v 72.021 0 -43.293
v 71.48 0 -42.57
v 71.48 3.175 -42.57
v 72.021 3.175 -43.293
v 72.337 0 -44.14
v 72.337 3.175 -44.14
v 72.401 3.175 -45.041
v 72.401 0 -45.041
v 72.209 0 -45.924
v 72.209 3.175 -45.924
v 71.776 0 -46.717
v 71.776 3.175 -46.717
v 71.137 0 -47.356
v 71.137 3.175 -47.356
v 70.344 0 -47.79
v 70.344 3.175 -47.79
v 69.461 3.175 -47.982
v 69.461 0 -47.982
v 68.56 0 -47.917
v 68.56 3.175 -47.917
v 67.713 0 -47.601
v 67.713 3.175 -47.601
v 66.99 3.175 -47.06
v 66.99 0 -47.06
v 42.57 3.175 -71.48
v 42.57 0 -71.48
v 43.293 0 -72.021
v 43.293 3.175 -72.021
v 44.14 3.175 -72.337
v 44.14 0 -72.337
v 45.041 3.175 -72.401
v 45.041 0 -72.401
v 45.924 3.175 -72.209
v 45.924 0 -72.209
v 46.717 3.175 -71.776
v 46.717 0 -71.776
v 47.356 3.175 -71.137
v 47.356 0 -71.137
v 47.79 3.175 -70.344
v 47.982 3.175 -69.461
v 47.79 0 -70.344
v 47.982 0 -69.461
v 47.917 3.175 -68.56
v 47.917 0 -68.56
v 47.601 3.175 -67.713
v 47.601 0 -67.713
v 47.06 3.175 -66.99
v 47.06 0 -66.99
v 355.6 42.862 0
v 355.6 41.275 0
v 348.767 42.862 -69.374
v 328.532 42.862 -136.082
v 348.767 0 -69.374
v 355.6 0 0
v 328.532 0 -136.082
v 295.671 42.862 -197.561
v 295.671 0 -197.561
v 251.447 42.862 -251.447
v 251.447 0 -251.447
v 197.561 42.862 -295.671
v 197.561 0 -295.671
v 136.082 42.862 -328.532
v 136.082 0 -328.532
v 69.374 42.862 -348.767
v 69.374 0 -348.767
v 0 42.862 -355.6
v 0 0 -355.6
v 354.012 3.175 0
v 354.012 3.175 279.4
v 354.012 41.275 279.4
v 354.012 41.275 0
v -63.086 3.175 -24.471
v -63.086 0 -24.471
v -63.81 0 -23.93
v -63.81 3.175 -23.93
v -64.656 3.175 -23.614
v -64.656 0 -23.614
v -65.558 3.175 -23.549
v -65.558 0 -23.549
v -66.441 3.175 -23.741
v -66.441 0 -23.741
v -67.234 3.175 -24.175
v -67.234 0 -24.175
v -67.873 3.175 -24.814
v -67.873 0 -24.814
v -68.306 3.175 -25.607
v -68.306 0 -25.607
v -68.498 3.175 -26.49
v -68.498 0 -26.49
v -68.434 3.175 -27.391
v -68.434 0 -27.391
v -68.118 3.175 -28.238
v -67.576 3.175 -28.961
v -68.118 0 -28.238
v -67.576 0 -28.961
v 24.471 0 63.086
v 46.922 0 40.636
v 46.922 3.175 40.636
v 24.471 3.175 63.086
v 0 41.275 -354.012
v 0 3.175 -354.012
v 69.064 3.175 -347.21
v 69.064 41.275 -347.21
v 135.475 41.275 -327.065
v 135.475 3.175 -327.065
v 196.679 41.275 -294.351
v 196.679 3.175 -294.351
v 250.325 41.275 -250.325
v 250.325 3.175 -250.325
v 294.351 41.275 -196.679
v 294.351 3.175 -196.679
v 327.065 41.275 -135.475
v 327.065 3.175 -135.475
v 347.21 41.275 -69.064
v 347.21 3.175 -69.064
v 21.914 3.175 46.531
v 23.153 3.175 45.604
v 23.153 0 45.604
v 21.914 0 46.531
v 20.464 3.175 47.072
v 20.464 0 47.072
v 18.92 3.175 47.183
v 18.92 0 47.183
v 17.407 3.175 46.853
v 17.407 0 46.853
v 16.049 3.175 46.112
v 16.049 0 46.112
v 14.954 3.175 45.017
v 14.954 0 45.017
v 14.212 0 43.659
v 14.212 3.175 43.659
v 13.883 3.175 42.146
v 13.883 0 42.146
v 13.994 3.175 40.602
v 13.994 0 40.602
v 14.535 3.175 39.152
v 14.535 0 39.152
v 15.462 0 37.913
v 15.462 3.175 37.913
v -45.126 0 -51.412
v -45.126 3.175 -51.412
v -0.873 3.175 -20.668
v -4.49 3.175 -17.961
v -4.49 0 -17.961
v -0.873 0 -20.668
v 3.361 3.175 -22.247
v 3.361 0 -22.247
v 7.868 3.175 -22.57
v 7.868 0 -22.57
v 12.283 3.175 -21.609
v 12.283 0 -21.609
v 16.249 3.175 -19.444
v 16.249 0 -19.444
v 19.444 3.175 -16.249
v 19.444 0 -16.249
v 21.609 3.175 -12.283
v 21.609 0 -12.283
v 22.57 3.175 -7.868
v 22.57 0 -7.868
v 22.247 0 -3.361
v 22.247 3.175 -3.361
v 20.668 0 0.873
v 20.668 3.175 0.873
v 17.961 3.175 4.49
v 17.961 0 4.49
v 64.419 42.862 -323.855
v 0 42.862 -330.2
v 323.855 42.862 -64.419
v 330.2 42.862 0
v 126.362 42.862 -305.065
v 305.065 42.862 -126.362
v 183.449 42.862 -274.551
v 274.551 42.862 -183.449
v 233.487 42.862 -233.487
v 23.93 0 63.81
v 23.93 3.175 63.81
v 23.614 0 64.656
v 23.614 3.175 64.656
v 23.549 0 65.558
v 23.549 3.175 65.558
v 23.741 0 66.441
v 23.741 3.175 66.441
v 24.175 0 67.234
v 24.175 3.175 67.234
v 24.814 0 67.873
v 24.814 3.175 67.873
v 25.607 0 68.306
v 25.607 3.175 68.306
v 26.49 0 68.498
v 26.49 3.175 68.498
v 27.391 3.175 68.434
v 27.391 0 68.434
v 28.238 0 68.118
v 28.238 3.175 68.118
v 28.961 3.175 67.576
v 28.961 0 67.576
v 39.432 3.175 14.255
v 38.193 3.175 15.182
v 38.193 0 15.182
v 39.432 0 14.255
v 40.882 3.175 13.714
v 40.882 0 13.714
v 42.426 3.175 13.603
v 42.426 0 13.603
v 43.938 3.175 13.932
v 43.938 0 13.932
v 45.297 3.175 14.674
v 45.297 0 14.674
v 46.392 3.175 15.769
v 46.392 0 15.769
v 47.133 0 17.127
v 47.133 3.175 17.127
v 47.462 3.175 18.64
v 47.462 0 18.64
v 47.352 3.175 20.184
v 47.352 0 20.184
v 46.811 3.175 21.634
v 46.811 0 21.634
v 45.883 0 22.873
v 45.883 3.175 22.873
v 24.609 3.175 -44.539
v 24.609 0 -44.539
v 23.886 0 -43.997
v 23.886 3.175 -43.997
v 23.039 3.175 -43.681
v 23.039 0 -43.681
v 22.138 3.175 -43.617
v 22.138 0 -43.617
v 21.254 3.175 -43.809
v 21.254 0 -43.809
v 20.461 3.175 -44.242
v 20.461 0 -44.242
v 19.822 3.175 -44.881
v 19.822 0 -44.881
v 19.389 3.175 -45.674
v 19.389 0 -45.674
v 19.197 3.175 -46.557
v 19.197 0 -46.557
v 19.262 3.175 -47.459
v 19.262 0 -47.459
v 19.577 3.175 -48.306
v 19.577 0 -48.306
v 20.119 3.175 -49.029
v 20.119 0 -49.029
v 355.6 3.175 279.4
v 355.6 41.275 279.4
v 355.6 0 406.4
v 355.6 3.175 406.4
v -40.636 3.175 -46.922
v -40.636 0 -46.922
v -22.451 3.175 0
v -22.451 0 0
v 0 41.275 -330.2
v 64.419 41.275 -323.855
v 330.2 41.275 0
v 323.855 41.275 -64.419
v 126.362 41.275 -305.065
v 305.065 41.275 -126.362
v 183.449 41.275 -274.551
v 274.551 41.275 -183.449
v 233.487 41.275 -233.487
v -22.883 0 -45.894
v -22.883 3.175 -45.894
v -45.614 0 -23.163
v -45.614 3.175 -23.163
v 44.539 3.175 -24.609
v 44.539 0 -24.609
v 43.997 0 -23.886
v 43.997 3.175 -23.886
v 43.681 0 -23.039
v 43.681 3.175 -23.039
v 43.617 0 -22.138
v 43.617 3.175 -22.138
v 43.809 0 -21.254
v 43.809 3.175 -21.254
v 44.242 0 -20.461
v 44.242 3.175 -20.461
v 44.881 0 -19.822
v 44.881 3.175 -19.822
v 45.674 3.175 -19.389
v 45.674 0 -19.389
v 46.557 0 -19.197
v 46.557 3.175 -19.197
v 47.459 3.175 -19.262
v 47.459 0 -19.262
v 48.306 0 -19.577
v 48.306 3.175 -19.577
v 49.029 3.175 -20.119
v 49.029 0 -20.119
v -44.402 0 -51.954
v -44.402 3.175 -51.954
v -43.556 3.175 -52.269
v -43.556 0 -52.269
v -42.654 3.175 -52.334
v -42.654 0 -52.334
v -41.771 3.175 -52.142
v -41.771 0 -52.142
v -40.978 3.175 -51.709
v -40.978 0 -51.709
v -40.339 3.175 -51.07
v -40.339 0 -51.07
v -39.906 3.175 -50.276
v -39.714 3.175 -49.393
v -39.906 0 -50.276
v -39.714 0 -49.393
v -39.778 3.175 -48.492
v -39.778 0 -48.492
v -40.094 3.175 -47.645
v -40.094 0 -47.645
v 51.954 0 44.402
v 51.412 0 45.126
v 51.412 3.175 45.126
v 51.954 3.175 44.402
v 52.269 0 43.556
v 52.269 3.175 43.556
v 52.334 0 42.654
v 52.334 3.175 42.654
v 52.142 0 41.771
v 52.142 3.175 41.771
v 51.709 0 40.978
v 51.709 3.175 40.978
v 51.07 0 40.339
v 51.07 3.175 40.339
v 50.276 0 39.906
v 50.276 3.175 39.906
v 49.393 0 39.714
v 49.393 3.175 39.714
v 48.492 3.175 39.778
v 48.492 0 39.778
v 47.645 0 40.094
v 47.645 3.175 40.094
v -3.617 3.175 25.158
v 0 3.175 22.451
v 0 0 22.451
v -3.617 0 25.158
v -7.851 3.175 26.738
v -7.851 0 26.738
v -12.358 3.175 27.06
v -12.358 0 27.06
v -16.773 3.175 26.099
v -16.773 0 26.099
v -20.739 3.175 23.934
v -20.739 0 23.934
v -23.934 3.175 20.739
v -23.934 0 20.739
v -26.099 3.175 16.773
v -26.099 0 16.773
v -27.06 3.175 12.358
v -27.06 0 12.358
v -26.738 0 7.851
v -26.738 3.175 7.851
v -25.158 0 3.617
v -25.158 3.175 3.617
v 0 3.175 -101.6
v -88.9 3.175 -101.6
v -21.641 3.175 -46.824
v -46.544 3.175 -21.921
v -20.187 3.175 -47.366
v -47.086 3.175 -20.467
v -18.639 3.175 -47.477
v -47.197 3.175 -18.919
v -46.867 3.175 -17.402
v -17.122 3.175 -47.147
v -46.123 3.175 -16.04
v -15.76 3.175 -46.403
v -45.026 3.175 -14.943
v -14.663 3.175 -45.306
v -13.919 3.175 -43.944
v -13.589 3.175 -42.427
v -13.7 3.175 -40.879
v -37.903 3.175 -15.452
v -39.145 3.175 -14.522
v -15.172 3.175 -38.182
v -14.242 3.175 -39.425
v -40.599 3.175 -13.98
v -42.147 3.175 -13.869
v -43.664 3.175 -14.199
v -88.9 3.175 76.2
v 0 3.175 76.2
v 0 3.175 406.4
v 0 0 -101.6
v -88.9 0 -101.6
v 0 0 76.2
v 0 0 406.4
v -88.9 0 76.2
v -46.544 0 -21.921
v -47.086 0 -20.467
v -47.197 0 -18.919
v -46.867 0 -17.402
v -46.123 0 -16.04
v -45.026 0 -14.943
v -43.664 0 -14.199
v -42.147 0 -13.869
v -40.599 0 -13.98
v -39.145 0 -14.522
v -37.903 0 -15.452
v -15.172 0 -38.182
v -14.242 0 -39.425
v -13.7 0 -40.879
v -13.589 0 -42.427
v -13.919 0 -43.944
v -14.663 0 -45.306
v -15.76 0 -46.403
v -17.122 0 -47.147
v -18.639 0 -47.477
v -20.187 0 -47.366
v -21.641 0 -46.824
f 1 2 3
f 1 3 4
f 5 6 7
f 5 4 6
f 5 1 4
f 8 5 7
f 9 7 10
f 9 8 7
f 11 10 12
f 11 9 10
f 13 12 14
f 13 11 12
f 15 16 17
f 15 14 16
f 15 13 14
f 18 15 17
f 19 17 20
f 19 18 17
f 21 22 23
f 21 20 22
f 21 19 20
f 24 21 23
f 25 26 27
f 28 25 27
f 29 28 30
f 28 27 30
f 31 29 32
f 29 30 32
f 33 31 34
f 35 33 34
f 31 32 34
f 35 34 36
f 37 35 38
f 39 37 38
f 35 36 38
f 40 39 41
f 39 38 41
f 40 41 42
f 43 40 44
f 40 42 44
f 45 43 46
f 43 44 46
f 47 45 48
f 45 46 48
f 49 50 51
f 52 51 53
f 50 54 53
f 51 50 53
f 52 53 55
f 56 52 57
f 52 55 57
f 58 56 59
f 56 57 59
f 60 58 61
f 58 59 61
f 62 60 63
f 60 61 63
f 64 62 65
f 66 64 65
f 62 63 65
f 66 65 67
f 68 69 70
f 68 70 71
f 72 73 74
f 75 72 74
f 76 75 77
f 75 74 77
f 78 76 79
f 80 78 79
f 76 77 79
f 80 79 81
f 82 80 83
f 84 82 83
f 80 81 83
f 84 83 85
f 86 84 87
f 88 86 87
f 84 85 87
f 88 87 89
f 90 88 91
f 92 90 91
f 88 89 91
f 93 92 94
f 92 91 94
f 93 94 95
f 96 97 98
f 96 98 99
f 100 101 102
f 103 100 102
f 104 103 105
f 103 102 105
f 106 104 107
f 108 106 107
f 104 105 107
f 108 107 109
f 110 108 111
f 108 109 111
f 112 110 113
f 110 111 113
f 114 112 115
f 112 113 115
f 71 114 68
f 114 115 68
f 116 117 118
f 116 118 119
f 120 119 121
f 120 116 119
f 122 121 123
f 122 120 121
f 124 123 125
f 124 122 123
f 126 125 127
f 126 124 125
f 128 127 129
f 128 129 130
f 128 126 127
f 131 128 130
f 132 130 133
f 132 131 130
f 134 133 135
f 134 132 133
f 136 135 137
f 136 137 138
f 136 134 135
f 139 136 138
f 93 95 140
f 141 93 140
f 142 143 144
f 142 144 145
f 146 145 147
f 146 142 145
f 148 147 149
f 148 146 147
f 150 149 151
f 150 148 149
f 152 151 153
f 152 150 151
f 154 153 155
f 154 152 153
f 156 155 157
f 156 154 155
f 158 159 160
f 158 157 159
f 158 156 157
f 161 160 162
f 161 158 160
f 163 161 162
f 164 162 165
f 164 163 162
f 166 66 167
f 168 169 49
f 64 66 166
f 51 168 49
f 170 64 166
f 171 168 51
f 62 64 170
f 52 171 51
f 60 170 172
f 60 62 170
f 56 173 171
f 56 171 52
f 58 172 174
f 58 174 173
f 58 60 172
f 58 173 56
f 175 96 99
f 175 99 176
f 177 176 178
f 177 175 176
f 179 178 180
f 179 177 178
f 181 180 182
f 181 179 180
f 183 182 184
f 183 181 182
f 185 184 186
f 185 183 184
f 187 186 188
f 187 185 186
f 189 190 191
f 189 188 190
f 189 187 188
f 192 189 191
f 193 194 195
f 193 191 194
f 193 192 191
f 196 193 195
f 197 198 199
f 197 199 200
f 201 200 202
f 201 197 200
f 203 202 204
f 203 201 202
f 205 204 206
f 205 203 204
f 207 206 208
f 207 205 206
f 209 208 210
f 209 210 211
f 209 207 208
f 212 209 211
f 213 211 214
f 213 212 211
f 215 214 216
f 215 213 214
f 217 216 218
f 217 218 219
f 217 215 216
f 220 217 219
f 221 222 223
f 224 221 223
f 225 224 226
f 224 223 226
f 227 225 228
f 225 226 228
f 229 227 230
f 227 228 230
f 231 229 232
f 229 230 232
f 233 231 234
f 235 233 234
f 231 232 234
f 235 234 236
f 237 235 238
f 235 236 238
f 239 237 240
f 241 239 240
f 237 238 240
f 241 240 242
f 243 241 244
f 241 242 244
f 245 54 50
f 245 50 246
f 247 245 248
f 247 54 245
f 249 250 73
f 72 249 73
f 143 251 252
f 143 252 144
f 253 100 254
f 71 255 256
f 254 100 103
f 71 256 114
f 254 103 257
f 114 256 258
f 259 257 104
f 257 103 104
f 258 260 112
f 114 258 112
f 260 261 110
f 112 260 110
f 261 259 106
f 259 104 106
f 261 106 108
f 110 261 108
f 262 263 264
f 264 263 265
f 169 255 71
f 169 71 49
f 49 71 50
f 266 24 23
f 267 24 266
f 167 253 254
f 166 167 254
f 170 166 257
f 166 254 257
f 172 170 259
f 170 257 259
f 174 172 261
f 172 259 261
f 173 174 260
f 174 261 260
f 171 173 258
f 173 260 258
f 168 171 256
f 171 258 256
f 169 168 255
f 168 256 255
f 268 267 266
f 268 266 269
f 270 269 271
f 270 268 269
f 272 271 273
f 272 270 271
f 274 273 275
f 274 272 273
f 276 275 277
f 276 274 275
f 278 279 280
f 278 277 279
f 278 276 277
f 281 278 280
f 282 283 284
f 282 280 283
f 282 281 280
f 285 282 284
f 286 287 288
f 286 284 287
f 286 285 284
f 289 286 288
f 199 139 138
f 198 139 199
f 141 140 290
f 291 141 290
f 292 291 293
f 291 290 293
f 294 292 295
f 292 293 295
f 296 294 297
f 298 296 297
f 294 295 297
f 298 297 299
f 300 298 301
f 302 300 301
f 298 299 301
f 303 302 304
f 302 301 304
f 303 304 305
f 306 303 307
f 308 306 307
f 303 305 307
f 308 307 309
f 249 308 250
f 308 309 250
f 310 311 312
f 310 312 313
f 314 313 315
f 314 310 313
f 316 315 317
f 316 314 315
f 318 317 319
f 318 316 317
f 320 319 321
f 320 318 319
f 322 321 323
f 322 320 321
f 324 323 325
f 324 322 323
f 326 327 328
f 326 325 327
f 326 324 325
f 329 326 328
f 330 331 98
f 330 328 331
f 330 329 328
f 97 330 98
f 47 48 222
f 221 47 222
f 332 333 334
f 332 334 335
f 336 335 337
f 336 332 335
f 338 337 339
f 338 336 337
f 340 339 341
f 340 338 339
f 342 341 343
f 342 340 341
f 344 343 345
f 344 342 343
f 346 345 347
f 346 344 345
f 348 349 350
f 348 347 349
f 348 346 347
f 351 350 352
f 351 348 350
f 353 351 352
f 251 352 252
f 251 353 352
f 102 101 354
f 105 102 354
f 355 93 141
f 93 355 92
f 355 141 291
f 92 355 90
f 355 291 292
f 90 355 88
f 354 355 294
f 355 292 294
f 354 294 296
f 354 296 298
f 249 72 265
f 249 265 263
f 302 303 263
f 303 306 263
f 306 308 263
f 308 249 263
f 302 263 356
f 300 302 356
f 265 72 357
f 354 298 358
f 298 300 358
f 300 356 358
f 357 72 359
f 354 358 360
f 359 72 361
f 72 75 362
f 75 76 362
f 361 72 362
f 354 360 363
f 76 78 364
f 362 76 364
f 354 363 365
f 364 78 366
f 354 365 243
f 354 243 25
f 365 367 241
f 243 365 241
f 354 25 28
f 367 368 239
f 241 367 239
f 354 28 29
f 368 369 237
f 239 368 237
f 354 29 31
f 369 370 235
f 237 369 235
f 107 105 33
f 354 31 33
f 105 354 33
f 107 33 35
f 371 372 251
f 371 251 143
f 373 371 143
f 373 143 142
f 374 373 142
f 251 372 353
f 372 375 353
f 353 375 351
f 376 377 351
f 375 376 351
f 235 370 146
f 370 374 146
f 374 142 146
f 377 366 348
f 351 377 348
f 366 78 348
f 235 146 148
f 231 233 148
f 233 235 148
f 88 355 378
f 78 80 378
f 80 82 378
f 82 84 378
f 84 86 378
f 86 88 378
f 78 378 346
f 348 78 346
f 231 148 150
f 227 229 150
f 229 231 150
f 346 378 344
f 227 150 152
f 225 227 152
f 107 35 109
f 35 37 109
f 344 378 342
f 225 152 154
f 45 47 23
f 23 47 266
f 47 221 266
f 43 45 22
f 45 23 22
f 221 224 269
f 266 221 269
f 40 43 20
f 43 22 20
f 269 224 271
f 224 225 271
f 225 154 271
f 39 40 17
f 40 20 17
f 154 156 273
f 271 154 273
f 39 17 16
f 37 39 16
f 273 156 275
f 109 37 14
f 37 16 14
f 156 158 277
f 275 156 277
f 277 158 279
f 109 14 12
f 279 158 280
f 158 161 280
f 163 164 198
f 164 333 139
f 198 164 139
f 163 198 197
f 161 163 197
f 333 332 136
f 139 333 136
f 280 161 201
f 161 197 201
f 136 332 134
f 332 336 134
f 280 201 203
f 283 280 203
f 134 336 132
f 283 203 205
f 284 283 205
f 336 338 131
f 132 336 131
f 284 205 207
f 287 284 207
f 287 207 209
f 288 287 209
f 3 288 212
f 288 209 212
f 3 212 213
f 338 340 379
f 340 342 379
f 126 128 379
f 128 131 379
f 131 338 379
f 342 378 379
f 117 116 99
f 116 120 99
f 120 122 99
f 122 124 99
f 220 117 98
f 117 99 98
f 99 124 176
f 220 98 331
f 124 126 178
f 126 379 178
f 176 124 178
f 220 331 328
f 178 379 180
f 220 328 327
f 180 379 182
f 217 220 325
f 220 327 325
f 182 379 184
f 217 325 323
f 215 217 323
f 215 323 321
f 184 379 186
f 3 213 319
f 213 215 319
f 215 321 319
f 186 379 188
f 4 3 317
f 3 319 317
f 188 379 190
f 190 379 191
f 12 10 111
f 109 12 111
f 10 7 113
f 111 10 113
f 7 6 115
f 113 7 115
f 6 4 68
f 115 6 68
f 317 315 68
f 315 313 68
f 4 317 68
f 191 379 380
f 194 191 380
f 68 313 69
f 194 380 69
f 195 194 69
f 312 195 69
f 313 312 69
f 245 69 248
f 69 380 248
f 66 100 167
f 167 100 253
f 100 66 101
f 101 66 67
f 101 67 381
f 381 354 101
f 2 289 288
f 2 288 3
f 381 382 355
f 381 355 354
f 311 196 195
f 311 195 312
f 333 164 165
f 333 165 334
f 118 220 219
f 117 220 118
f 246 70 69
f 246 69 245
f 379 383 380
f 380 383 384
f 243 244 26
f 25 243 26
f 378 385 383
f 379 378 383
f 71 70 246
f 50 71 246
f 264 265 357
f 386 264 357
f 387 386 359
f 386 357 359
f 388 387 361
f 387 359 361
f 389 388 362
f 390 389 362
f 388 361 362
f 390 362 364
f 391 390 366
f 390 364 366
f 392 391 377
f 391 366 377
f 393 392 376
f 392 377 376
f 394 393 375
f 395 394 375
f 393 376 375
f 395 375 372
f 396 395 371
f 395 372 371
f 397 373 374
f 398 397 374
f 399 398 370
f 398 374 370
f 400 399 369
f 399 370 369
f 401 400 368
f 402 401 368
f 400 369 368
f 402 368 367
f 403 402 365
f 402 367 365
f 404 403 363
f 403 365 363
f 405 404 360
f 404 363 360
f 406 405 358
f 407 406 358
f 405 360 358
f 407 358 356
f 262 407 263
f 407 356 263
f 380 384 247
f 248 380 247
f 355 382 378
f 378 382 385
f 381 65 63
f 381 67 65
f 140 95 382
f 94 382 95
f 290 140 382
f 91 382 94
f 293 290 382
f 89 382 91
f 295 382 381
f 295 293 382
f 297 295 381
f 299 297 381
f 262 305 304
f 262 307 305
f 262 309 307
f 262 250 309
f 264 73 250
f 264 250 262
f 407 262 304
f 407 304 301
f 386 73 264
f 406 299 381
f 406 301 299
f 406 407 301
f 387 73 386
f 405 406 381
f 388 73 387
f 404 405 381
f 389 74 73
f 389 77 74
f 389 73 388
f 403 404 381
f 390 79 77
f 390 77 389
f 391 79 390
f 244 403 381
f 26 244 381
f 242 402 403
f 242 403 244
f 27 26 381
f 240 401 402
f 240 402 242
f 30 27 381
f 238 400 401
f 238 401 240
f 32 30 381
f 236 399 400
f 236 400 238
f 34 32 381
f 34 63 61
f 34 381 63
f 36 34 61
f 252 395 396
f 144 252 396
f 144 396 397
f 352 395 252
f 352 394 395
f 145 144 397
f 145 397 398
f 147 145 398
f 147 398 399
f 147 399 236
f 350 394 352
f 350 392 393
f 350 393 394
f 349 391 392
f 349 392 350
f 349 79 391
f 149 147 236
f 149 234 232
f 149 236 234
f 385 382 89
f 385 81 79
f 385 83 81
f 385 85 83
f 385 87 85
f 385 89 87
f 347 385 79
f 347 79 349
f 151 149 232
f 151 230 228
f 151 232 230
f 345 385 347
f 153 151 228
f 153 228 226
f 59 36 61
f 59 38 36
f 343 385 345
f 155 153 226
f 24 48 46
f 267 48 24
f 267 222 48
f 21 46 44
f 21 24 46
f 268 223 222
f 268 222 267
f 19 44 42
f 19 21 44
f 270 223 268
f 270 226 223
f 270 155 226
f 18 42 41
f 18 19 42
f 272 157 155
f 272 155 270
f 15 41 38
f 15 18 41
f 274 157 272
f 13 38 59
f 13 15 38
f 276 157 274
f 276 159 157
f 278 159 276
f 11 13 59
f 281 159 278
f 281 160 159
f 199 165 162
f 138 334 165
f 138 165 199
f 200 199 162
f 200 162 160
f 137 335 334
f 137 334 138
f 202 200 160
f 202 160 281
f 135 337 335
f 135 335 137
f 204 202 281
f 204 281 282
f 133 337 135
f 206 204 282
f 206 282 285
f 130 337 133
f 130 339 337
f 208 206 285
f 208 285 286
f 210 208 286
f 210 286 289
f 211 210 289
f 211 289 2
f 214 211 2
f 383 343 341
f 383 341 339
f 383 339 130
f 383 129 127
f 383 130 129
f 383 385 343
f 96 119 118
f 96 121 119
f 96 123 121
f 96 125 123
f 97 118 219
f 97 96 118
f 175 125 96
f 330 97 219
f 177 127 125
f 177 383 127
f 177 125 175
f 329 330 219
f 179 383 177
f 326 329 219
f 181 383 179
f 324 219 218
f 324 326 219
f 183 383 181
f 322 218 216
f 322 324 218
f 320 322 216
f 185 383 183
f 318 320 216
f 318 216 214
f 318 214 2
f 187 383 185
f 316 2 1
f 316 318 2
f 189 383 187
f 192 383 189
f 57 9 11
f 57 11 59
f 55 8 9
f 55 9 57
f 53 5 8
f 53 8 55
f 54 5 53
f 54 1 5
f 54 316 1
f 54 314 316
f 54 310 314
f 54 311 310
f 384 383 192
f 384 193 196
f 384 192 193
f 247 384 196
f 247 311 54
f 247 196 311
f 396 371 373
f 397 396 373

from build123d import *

# Parameters (mm, degrees)
BOSS_EXTRUDE1_DEPTH  = 3.175
BOSS_EXTRUDE2_DEPTH  = 38.1
SKETCH4_W            = 1.5875
SKETCH4_H            = 279.4
BOSS_EXTRUDE3_DEPTH  = 38.1
SKETCH6_R            = 1.5875
CUT_EXTRUDE1_DEPTH   = 19.05
SKETCH10_W           = 101.6
SKETCH10_H           = 3.175
BOSS_EXTRUDE5_DEPTH  = 63.5
SKETCH12_W           = 355.6
SKETCH12_H           = 101.6
BOSS_EXTRUDE6_DEPTH  = 3.175
SKETCH13_W           = 63.5
SKETCH13_H           = 63.5
SKETCH13_H_2         = 12.7
BOSS_EXTRUDE7_DEPTH  = 3.175
CUT_EXTRUDE3_DEPTH   = 38.1
BOSS_EXTRUDE10_DEPTH = 1.5875
CUT_EXTRUDE5_DEPTH   = 3.175
SKETCH22_W           = 25.4
SKETCH22_H           = 177.8
BOSS_EXTRUDE11_DEPTH = 3.175
CUT_EXTRUDE6_DEPTH   = 33.02


with BuildPart() as part:
    # Sketch2 → Boss-Extrude1 (new body)
    with BuildSketch(Plane(origin=(0, 0, 0), x_dir=(1, 0, 0), z_dir=(0, 1, 0))):
        with BuildLine():
            Line((0, 355.6), (0, 0))
            Line((0, 0), (0, -304.8))
            Line((0, -304.8), (355.6, -304.8))
            Line((355.6, -304.8), (355.6, 0))
            ThreePointArc((355.6, 0), (251.44717139, 251.44717139), (0, 355.6))
        make_face()
    extrude(amount=BOSS_EXTRUDE1_DEPTH)

    # Sketch3 → Boss-Extrude2 (add)
    with BuildSketch(Plane(origin=(0, 3.175, 0), x_dir=(1, 0, 0), z_dir=(0, 1, 0))):
        with BuildLine():
            Line((0, 355.6), (0, 354.0125))
            ThreePointArc((0, 354.0125), (250.324639375, 250.324639375), (354.0125, 0))
            Line((354.0125, 0), (355.6, 0))
            ThreePointArc((355.6, 0), (251.44717139, 251.44717139), (0, 355.6))
        make_face()
    extrude(amount=BOSS_EXTRUDE2_DEPTH)

    # Sketch4 → Boss-Extrude3 (add)
    with BuildSketch(Plane(origin=(0, 3.175, 0), x_dir=(1, 0, 0), z_dir=(0, 1, 0))):
        with Locations((354.80625, -139.7)):
            Rectangle(SKETCH4_W, SKETCH4_H)
    extrude(amount=BOSS_EXTRUDE3_DEPTH)

    # Sketch6 → Cut-Extrude1 (cut)
    with BuildSketch(Plane(origin=(0, 3.175, 0), x_dir=(1, 0, 0), z_dir=(0, 1, 0))):
        Circle(SKETCH6_R)
    extrude(amount=-CUT_EXTRUDE1_DEPTH, mode=Mode.SUBTRACT)

    # Sketch10 → Boss-Extrude5 (add)
    with BuildSketch(Plane.ZY):
        with Locations((12.7, 1.5875)):
            Rectangle(SKETCH10_W, SKETCH10_H)
    extrude(amount=BOSS_EXTRUDE5_DEPTH)

    # Sketch12 → Boss-Extrude6 (add)
    with BuildSketch(Plane.XZ):
        with Locations((177.8, 355.6)):
            Rectangle(SKETCH12_W, SKETCH12_H)
    extrude(amount=-BOSS_EXTRUDE6_DEPTH)

    # Sketch13 → Boss-Extrude7 (add)
    with BuildSketch(Plane(origin=(0, 3.175, 0), x_dir=(1, 0, 0), z_dir=(0, 1, 0))):
        with Locations((-31.75, 69.85)):
            Rectangle(SKETCH13_W, SKETCH13_H)
        with Locations((-31.75, -69.85)):
            Rectangle(SKETCH13_W, SKETCH13_H_2)
    extrude(amount=-BOSS_EXTRUDE7_DEPTH)

    # Sketch11 → Cut-Extrude3 (cut)
    with BuildSketch(Plane(origin=(0, 3.175, 0), x_dir=(1, 0, 0), z_dir=(0, 1, 0))):
        with BuildLine():
            Line((-22.450640303, 0), (-4.490128061, 17.960512242))
            ThreePointArc((-4.490128061, 17.960512242), (17.960512242, 17.960512242), (17.960512242, -4.490128061))
            Line((17.960512242, -4.490128061), (0, -22.450640303))
            ThreePointArc((0, -22.450640303), (-22.450640303, -22.450640303), (-22.450640303, 0))
        make_face()
    extrude(amount=-CUT_EXTRUDE3_DEPTH, mode=Mode.SUBTRACT)

    # Sketch18 → Boss-Extrude10 (add)
    with BuildSketch(Plane(origin=(0, 41.275, 0), x_dir=(1, 0, 0), z_dir=(0, 1, 0))):
        with BuildLine():
            Line((0, 355.6), (0, 330.2))
            ThreePointArc((0, 330.2), (233.486659148, 233.486659148), (330.2, 0))
            Line((330.2, 0), (355.6, 0))
            ThreePointArc((355.6, 0), (251.44717139, 251.44717139), (0, 355.6))
        make_face()
    extrude(amount=BOSS_EXTRUDE10_DEPTH)

    # Sketch19 → Cut-Extrude5 (cut)
    with BuildSketch(Plane(origin=(44.866081356, 3.175, 35.384906035), x_dir=(-0.707106781186549, 0, -0.7071067811865461), z_dir=(0, 1, 0))):
        with BuildLine():
            Line((19.004203404, 22.579203363), (19.004203404, -9.566550011))
            ThreePointArc((19.004203404, -9.566550011), (13.566017381, -15.004736034), (8.127831358, -9.566550011))
            Line((8.127831358, -9.566550011), (8.127831358, 22.579203363))
            ThreePointArc((8.127831358, 22.579203363), (13.566017381, 28.017389386), (19.004203404, 22.579203363))
        make_face()
        with BuildLine():
            Line((94.473450284, 22.579203363), (94.473450284, -9.566550011))
            ThreePointArc((94.473450284, -9.566550011), (99.926017381, -15.019117108), (105.378584479, -9.566550011))
            Line((105.378584479, -9.566550011), (105.378584479, 22.579203363))
            ThreePointArc((105.378584479, 22.579203363), (99.926017381, 28.03177046), (94.473450284, 22.579203363))
        make_face()
    extrude(amount=-CUT_EXTRUDE5_DEPTH, mode=Mode.SUBTRACT)

    # Sketch22 → Boss-Extrude11 (add)
    with BuildSketch(Plane.XZ):
        with Locations((-76.2, -12.7)):
            Rectangle(SKETCH22_W, SKETCH22_H)
    extrude(amount=-BOSS_EXTRUDE11_DEPTH)

    # Sketch20 → Cut-Extrude6 (cut)
    with BuildSketch(Plane(origin=(269.3998556, -22.225, -80.446532344), x_dir=(1, 0, 0), z_dir=(0, 1, 0))):
        with BuildLine():
            Line((-336.976282911, -51.485206353), (-314.525642608, -29.034566051))
            ThreePointArc((-314.525642608, -29.034566051), (-310.035514547, -29.034566051), (-310.035514547, -33.524694111))
            Line((-310.035514547, -33.524694111), (-332.48615485, -55.975334414))
            ThreePointArc((-332.48615485, -55.975334414), (-336.976282911, -55.975334414), (-336.976282911, -51.485206353))
        make_face()
        with BuildLine():
            Line((-240.438529609, -148.022959655), (-217.987889306, -125.572319352))
            ThreePointArc((-217.987889306, -125.572319352), (-217.987889306, -121.082191292), (-222.478017367, -121.082191292))
            Line((-222.478017367, -121.082191292), (-244.92865767, -143.532831594))
            ThreePointArc((-244.92865767, -143.532831594), (-244.92865767, -148.022959655), (-240.438529609, -148.022959655))
        make_face()
        with BuildLine():
            Line((-249.280873656, -31.417542155), (-226.830233353, -8.966901852))
            ThreePointArc((-226.830233353, -8.966901852), (-222.340105293, -8.966901852), (-222.340105293, -13.457029913))
            Line((-222.340105293, -13.457029913), (-244.790745596, -35.907670216))
            ThreePointArc((-244.790745596, -35.907670216), (-249.280873656, -35.907670216), (-249.280873656, -31.417542155))
        make_face()
        with BuildLine():
            Line((-220.370865411, -60.3275504), (-197.920225108, -37.876910098))
            ThreePointArc((-197.920225108, -37.876910098), (-197.920225108, -33.386782037), (-202.410353169, -33.386782037))
            Line((-202.410353169, -33.386782037), (-224.860993471, -55.83742234))
            ThreePointArc((-224.860993471, -55.83742234), (-224.860993471, -60.3275504), (-220.370865411, -60.3275504))
        make_face()
    extrude(amount=CUT_EXTRUDE6_DEPTH, mode=Mode.SUBTRACT)


solid = part.part
